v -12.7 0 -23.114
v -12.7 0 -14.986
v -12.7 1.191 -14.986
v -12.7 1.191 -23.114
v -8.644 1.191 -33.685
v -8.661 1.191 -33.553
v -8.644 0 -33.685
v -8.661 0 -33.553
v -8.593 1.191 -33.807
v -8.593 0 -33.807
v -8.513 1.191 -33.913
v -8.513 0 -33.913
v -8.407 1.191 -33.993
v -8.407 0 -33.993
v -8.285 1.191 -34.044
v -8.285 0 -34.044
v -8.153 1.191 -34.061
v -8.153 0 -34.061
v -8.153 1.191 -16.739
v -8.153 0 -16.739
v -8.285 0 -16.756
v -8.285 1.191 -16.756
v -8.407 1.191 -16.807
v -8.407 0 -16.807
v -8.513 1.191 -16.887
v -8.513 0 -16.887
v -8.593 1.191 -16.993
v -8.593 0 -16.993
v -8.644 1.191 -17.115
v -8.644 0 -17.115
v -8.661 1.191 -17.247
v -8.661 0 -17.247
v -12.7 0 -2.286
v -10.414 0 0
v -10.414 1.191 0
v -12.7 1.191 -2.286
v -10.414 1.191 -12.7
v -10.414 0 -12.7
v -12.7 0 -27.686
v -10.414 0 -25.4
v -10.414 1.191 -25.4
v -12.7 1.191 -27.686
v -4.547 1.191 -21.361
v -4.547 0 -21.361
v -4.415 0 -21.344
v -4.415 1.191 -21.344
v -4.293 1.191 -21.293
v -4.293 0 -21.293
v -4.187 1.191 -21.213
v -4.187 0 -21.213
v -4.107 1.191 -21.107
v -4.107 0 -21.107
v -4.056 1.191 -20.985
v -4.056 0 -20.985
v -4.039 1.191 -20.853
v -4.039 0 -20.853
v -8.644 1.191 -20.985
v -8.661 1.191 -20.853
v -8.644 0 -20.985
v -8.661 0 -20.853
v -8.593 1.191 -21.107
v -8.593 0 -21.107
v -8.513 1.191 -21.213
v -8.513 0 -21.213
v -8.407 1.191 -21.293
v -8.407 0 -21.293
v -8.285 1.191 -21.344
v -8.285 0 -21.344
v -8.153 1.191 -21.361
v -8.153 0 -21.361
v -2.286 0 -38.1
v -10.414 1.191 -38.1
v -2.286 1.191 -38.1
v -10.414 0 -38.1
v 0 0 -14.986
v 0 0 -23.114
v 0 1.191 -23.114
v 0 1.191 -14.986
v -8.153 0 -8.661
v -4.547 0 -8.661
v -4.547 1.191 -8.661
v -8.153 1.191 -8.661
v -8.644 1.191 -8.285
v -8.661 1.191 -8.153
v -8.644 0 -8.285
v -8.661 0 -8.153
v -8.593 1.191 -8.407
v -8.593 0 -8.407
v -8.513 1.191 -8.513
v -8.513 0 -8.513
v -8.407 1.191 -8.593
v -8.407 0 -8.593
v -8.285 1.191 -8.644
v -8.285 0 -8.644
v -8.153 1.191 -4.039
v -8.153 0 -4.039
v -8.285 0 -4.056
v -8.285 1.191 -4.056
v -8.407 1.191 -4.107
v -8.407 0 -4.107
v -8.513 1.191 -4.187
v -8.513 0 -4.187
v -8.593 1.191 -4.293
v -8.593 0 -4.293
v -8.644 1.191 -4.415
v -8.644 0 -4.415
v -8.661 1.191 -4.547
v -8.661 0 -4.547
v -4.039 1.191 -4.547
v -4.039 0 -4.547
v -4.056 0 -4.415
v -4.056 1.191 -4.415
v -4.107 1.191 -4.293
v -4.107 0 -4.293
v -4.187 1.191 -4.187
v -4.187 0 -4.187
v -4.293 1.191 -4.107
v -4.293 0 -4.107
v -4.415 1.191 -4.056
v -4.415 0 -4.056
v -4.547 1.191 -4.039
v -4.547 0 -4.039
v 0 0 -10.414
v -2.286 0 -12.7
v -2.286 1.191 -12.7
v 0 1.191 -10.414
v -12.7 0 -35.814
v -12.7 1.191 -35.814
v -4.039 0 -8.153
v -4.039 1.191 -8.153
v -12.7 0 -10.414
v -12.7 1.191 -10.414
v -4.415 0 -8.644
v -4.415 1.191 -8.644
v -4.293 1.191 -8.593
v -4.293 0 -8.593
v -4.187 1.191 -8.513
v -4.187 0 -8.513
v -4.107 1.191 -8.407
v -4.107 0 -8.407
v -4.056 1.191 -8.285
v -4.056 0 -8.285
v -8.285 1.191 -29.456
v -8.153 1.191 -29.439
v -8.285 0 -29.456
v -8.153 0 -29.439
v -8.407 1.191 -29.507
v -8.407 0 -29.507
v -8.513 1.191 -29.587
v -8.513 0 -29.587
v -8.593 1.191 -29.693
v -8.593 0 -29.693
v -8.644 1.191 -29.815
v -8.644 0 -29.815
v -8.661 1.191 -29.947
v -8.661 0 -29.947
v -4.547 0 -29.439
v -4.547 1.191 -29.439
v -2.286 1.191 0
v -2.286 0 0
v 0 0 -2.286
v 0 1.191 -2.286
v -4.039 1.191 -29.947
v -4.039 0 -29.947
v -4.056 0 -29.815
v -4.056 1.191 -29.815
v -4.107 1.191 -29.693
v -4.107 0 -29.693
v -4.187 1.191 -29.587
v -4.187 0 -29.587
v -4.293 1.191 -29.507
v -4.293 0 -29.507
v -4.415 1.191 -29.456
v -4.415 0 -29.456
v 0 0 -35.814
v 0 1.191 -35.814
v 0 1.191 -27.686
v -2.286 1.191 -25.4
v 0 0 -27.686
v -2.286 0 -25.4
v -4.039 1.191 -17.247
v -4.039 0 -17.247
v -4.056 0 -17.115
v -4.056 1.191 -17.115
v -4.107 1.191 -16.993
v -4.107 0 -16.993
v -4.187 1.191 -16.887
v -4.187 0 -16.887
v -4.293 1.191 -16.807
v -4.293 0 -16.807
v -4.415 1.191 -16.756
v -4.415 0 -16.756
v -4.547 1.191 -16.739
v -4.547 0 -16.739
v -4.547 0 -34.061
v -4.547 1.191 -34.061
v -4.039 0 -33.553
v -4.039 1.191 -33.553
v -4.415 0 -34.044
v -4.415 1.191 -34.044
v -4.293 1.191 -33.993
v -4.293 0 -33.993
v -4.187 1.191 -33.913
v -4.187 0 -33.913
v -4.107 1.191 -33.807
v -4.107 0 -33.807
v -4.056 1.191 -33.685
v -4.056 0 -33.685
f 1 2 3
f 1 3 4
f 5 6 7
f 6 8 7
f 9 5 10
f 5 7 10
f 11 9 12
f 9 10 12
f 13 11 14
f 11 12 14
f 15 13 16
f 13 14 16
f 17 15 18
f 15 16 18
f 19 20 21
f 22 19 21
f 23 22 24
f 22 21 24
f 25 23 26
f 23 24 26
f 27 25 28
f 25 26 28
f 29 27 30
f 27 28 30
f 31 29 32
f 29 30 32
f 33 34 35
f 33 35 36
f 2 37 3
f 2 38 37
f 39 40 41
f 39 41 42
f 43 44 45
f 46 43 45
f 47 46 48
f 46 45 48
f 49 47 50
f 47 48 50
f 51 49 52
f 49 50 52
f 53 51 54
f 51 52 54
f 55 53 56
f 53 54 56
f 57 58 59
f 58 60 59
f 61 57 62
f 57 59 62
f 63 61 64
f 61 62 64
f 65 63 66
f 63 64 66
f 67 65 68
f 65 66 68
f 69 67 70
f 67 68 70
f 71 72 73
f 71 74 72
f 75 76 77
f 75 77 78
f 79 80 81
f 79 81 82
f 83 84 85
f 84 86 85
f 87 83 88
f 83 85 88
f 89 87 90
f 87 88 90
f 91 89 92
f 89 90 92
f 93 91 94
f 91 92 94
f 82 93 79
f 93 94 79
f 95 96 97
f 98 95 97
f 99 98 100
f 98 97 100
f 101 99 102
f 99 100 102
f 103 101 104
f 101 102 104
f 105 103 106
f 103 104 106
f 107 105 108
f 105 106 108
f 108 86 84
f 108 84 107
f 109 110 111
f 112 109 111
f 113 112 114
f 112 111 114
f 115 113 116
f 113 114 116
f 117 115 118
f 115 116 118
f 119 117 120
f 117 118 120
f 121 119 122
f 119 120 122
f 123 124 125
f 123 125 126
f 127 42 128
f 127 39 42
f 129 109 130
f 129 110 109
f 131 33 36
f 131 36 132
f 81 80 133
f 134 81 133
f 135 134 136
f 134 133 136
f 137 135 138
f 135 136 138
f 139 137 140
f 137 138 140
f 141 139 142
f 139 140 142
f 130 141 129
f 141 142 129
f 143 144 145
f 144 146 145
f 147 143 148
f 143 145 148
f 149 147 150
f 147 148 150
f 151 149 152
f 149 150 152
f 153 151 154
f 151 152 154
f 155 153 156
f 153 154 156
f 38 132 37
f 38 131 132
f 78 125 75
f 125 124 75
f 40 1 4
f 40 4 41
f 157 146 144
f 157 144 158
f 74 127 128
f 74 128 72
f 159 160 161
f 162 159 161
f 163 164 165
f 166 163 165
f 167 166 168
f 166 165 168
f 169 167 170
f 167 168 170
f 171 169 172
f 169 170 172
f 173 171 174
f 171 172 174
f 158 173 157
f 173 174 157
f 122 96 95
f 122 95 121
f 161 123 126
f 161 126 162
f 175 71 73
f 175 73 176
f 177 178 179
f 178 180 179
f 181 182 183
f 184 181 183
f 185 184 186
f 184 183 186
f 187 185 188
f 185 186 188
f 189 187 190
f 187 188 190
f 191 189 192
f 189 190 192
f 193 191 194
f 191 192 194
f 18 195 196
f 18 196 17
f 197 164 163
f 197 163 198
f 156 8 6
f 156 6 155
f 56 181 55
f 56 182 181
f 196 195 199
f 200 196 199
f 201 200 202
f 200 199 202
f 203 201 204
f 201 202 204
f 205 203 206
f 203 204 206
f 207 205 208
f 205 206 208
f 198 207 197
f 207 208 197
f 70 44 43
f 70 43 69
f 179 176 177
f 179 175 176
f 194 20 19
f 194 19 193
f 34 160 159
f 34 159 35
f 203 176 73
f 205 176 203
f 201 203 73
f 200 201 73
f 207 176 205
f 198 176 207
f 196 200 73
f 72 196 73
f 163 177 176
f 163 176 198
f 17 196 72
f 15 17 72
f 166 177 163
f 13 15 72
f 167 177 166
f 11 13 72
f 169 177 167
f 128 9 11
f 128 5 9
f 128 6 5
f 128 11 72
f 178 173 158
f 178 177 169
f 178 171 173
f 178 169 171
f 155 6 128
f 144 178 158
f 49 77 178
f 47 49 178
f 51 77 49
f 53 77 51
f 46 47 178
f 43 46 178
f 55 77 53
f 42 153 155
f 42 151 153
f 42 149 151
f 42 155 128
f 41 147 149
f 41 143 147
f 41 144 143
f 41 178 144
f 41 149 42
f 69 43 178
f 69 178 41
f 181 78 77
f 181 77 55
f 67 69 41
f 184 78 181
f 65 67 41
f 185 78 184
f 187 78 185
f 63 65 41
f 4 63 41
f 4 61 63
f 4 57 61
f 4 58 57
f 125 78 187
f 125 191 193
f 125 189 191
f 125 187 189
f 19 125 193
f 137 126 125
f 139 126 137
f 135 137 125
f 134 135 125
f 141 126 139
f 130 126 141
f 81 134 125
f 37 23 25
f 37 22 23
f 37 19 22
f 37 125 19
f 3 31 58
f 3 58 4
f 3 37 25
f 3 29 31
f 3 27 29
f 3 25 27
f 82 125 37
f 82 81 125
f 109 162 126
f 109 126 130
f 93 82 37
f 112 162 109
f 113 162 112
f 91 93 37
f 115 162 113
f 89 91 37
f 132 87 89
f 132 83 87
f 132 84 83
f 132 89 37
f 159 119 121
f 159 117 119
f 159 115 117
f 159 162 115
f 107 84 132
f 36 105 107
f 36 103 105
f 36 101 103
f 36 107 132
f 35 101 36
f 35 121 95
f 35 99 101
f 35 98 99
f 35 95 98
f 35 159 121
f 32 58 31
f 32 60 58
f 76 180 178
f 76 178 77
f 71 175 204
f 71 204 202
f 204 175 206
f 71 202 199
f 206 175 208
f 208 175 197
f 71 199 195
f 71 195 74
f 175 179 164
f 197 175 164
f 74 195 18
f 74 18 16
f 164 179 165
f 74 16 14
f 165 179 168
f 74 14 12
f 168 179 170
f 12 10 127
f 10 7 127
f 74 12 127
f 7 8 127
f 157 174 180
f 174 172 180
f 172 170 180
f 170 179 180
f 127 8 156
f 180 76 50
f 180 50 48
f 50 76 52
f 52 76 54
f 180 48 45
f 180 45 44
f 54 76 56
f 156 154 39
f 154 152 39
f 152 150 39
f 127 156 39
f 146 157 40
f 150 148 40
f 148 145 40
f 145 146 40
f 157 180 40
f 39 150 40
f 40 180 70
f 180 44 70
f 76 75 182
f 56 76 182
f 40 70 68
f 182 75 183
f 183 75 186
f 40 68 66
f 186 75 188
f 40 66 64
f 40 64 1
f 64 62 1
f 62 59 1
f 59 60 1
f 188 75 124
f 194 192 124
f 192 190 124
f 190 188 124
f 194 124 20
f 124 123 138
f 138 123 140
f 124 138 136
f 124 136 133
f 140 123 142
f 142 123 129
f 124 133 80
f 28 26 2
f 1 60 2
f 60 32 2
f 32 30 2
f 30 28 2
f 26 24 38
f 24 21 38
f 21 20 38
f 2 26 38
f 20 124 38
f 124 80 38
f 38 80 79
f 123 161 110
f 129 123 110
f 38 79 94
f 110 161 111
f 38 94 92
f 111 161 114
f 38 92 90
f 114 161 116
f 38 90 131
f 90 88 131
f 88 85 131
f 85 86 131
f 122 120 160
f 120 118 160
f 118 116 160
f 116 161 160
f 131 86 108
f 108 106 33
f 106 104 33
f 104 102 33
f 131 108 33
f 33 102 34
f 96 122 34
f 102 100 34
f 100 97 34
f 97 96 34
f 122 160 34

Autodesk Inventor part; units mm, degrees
ref_plane "YZ Plane" through (0, 0, 0) normal (1, 0, 0) x (0, 1, 0)
ref_plane "XZ Plane" through (0, 0, 0) normal (0, 1, 0) x (-1, 0, 0)
ref_plane "XY Plane" through (0, 0, 0) normal (0, 0, 1) x (1, 0, 0)
sketch "Sketch1" plane through (0, 0, 0) normal (0, 1, 0) x (-1, 0, 0)
  line L0 (2.286, 0) -> (10.414, 0)
  line L1 (12.7, -2.286) -> (12.7, -10.414)
  line L2 (10.414, -12.7) -> (2.286, -12.7)
  line L3 (0, -10.414) -> (0, -2.286)
  line L4 (8.1534, -4.0386) -> (4.5466, -4.0386)
  line L5 (4.0386, -4.5466) -> (4.0386, -8.1534)
  line L6 (4.5466, -8.6614) -> (8.1534, -8.6614)
  line L7 (8.6614, -8.1534) -> (8.6614, -4.5466)
  line L8 (10.414, 0) -> (12.7, -2.286)
  line L9 (12.7, -10.414) -> (10.414, -12.7)
  line L10 (2.286, -12.7) -> (0, -10.414)
  line L11 (2.286, 0) -> (0, -2.286)
  arc A0 (8.6614, -4.5466) -> (8.1534, -4.0386) centre (8.1534, -4.5466) ccw
  arc A1 (8.1534, -8.6614) -> (8.6614, -8.1534) centre (8.1534, -8.1534) ccw
  arc A2 (4.0386, -8.1534) -> (4.5466, -8.6614) centre (4.5466, -8.1534) ccw
  arc A3 (4.5466, -4.0386) -> (4.0386, -4.5466) centre (4.5466, -4.5466) ccw
  line L12 (8.1534, -4.5466) -> (4.5466, -8.1534) construction
  line L13 (12.7, -10.414) -> (0, -2.286) construction
  point P0 (0, 0)
  point P1 (12.7, -12.7)
  point P2 (12.7, 0)
  point P3 (0, -12.7)
  point P4 (4.0386, -8.6614)
  point P5 (8.6614, -8.6614)
  point P6 (6.35, -6.35)
  dimension "d1" = 12.7
  dimension "d2" = 4.6228
  dimension "d3" = 2.286
  dimension "d4" = 2.286
  dimension "d5" = 2.286
  dimension "d6" = 2.286
  dimension "d7" = 2.286
  dimension "d8" = 2.286
  dimension "d9" = 2.286
  dimension "d10" = 2.286
  dimension "d11" = 0.508
extrude "Body" add sketch "Sketch1" along normal blind 1.1906
sketch "Sketch2" plane through (0, 1.1906, 0) normal (0, 1, 0) x (1, 0, 0)
  arc A0 (-8.1534, 8.6614) -> (-8.6614, 8.1534) centre (-8.1534, 8.1534) ccw construction
  arc A1 (-4.5466, 4.0386) -> (-4.0386, 4.5466) centre (-4.5466, 4.5466) ccw construction
  circle A2 centre (-6.35, 6.35) radius 2.1844
  line L0 (-8.1534, 8.1534) -> (-4.5466, 4.5466) construction
  point P0 (0, 0)
  dimension "d14" = 4.3688
surface extrude "Circle" sketch "Sketch2" against normal up to surface (1.1906 mm away) shown yes curves A2
pattern_linear "Rectangular Pattern1" count 3 spacing 12.7 along (0, 0, -1) of "Body", "Circle"
equation "\"d4\" = d3"
equation "\"d5\" = d3"
equation "\"d6\" = d5"
equation "\"d7\" = d3"
equation "\"d8\" = d7"
equation "\"d9\" = d3"
equation "\"d10\" = d9"
equation "\"d22\" = d19"
equation "\"d19\" = 12.7"
